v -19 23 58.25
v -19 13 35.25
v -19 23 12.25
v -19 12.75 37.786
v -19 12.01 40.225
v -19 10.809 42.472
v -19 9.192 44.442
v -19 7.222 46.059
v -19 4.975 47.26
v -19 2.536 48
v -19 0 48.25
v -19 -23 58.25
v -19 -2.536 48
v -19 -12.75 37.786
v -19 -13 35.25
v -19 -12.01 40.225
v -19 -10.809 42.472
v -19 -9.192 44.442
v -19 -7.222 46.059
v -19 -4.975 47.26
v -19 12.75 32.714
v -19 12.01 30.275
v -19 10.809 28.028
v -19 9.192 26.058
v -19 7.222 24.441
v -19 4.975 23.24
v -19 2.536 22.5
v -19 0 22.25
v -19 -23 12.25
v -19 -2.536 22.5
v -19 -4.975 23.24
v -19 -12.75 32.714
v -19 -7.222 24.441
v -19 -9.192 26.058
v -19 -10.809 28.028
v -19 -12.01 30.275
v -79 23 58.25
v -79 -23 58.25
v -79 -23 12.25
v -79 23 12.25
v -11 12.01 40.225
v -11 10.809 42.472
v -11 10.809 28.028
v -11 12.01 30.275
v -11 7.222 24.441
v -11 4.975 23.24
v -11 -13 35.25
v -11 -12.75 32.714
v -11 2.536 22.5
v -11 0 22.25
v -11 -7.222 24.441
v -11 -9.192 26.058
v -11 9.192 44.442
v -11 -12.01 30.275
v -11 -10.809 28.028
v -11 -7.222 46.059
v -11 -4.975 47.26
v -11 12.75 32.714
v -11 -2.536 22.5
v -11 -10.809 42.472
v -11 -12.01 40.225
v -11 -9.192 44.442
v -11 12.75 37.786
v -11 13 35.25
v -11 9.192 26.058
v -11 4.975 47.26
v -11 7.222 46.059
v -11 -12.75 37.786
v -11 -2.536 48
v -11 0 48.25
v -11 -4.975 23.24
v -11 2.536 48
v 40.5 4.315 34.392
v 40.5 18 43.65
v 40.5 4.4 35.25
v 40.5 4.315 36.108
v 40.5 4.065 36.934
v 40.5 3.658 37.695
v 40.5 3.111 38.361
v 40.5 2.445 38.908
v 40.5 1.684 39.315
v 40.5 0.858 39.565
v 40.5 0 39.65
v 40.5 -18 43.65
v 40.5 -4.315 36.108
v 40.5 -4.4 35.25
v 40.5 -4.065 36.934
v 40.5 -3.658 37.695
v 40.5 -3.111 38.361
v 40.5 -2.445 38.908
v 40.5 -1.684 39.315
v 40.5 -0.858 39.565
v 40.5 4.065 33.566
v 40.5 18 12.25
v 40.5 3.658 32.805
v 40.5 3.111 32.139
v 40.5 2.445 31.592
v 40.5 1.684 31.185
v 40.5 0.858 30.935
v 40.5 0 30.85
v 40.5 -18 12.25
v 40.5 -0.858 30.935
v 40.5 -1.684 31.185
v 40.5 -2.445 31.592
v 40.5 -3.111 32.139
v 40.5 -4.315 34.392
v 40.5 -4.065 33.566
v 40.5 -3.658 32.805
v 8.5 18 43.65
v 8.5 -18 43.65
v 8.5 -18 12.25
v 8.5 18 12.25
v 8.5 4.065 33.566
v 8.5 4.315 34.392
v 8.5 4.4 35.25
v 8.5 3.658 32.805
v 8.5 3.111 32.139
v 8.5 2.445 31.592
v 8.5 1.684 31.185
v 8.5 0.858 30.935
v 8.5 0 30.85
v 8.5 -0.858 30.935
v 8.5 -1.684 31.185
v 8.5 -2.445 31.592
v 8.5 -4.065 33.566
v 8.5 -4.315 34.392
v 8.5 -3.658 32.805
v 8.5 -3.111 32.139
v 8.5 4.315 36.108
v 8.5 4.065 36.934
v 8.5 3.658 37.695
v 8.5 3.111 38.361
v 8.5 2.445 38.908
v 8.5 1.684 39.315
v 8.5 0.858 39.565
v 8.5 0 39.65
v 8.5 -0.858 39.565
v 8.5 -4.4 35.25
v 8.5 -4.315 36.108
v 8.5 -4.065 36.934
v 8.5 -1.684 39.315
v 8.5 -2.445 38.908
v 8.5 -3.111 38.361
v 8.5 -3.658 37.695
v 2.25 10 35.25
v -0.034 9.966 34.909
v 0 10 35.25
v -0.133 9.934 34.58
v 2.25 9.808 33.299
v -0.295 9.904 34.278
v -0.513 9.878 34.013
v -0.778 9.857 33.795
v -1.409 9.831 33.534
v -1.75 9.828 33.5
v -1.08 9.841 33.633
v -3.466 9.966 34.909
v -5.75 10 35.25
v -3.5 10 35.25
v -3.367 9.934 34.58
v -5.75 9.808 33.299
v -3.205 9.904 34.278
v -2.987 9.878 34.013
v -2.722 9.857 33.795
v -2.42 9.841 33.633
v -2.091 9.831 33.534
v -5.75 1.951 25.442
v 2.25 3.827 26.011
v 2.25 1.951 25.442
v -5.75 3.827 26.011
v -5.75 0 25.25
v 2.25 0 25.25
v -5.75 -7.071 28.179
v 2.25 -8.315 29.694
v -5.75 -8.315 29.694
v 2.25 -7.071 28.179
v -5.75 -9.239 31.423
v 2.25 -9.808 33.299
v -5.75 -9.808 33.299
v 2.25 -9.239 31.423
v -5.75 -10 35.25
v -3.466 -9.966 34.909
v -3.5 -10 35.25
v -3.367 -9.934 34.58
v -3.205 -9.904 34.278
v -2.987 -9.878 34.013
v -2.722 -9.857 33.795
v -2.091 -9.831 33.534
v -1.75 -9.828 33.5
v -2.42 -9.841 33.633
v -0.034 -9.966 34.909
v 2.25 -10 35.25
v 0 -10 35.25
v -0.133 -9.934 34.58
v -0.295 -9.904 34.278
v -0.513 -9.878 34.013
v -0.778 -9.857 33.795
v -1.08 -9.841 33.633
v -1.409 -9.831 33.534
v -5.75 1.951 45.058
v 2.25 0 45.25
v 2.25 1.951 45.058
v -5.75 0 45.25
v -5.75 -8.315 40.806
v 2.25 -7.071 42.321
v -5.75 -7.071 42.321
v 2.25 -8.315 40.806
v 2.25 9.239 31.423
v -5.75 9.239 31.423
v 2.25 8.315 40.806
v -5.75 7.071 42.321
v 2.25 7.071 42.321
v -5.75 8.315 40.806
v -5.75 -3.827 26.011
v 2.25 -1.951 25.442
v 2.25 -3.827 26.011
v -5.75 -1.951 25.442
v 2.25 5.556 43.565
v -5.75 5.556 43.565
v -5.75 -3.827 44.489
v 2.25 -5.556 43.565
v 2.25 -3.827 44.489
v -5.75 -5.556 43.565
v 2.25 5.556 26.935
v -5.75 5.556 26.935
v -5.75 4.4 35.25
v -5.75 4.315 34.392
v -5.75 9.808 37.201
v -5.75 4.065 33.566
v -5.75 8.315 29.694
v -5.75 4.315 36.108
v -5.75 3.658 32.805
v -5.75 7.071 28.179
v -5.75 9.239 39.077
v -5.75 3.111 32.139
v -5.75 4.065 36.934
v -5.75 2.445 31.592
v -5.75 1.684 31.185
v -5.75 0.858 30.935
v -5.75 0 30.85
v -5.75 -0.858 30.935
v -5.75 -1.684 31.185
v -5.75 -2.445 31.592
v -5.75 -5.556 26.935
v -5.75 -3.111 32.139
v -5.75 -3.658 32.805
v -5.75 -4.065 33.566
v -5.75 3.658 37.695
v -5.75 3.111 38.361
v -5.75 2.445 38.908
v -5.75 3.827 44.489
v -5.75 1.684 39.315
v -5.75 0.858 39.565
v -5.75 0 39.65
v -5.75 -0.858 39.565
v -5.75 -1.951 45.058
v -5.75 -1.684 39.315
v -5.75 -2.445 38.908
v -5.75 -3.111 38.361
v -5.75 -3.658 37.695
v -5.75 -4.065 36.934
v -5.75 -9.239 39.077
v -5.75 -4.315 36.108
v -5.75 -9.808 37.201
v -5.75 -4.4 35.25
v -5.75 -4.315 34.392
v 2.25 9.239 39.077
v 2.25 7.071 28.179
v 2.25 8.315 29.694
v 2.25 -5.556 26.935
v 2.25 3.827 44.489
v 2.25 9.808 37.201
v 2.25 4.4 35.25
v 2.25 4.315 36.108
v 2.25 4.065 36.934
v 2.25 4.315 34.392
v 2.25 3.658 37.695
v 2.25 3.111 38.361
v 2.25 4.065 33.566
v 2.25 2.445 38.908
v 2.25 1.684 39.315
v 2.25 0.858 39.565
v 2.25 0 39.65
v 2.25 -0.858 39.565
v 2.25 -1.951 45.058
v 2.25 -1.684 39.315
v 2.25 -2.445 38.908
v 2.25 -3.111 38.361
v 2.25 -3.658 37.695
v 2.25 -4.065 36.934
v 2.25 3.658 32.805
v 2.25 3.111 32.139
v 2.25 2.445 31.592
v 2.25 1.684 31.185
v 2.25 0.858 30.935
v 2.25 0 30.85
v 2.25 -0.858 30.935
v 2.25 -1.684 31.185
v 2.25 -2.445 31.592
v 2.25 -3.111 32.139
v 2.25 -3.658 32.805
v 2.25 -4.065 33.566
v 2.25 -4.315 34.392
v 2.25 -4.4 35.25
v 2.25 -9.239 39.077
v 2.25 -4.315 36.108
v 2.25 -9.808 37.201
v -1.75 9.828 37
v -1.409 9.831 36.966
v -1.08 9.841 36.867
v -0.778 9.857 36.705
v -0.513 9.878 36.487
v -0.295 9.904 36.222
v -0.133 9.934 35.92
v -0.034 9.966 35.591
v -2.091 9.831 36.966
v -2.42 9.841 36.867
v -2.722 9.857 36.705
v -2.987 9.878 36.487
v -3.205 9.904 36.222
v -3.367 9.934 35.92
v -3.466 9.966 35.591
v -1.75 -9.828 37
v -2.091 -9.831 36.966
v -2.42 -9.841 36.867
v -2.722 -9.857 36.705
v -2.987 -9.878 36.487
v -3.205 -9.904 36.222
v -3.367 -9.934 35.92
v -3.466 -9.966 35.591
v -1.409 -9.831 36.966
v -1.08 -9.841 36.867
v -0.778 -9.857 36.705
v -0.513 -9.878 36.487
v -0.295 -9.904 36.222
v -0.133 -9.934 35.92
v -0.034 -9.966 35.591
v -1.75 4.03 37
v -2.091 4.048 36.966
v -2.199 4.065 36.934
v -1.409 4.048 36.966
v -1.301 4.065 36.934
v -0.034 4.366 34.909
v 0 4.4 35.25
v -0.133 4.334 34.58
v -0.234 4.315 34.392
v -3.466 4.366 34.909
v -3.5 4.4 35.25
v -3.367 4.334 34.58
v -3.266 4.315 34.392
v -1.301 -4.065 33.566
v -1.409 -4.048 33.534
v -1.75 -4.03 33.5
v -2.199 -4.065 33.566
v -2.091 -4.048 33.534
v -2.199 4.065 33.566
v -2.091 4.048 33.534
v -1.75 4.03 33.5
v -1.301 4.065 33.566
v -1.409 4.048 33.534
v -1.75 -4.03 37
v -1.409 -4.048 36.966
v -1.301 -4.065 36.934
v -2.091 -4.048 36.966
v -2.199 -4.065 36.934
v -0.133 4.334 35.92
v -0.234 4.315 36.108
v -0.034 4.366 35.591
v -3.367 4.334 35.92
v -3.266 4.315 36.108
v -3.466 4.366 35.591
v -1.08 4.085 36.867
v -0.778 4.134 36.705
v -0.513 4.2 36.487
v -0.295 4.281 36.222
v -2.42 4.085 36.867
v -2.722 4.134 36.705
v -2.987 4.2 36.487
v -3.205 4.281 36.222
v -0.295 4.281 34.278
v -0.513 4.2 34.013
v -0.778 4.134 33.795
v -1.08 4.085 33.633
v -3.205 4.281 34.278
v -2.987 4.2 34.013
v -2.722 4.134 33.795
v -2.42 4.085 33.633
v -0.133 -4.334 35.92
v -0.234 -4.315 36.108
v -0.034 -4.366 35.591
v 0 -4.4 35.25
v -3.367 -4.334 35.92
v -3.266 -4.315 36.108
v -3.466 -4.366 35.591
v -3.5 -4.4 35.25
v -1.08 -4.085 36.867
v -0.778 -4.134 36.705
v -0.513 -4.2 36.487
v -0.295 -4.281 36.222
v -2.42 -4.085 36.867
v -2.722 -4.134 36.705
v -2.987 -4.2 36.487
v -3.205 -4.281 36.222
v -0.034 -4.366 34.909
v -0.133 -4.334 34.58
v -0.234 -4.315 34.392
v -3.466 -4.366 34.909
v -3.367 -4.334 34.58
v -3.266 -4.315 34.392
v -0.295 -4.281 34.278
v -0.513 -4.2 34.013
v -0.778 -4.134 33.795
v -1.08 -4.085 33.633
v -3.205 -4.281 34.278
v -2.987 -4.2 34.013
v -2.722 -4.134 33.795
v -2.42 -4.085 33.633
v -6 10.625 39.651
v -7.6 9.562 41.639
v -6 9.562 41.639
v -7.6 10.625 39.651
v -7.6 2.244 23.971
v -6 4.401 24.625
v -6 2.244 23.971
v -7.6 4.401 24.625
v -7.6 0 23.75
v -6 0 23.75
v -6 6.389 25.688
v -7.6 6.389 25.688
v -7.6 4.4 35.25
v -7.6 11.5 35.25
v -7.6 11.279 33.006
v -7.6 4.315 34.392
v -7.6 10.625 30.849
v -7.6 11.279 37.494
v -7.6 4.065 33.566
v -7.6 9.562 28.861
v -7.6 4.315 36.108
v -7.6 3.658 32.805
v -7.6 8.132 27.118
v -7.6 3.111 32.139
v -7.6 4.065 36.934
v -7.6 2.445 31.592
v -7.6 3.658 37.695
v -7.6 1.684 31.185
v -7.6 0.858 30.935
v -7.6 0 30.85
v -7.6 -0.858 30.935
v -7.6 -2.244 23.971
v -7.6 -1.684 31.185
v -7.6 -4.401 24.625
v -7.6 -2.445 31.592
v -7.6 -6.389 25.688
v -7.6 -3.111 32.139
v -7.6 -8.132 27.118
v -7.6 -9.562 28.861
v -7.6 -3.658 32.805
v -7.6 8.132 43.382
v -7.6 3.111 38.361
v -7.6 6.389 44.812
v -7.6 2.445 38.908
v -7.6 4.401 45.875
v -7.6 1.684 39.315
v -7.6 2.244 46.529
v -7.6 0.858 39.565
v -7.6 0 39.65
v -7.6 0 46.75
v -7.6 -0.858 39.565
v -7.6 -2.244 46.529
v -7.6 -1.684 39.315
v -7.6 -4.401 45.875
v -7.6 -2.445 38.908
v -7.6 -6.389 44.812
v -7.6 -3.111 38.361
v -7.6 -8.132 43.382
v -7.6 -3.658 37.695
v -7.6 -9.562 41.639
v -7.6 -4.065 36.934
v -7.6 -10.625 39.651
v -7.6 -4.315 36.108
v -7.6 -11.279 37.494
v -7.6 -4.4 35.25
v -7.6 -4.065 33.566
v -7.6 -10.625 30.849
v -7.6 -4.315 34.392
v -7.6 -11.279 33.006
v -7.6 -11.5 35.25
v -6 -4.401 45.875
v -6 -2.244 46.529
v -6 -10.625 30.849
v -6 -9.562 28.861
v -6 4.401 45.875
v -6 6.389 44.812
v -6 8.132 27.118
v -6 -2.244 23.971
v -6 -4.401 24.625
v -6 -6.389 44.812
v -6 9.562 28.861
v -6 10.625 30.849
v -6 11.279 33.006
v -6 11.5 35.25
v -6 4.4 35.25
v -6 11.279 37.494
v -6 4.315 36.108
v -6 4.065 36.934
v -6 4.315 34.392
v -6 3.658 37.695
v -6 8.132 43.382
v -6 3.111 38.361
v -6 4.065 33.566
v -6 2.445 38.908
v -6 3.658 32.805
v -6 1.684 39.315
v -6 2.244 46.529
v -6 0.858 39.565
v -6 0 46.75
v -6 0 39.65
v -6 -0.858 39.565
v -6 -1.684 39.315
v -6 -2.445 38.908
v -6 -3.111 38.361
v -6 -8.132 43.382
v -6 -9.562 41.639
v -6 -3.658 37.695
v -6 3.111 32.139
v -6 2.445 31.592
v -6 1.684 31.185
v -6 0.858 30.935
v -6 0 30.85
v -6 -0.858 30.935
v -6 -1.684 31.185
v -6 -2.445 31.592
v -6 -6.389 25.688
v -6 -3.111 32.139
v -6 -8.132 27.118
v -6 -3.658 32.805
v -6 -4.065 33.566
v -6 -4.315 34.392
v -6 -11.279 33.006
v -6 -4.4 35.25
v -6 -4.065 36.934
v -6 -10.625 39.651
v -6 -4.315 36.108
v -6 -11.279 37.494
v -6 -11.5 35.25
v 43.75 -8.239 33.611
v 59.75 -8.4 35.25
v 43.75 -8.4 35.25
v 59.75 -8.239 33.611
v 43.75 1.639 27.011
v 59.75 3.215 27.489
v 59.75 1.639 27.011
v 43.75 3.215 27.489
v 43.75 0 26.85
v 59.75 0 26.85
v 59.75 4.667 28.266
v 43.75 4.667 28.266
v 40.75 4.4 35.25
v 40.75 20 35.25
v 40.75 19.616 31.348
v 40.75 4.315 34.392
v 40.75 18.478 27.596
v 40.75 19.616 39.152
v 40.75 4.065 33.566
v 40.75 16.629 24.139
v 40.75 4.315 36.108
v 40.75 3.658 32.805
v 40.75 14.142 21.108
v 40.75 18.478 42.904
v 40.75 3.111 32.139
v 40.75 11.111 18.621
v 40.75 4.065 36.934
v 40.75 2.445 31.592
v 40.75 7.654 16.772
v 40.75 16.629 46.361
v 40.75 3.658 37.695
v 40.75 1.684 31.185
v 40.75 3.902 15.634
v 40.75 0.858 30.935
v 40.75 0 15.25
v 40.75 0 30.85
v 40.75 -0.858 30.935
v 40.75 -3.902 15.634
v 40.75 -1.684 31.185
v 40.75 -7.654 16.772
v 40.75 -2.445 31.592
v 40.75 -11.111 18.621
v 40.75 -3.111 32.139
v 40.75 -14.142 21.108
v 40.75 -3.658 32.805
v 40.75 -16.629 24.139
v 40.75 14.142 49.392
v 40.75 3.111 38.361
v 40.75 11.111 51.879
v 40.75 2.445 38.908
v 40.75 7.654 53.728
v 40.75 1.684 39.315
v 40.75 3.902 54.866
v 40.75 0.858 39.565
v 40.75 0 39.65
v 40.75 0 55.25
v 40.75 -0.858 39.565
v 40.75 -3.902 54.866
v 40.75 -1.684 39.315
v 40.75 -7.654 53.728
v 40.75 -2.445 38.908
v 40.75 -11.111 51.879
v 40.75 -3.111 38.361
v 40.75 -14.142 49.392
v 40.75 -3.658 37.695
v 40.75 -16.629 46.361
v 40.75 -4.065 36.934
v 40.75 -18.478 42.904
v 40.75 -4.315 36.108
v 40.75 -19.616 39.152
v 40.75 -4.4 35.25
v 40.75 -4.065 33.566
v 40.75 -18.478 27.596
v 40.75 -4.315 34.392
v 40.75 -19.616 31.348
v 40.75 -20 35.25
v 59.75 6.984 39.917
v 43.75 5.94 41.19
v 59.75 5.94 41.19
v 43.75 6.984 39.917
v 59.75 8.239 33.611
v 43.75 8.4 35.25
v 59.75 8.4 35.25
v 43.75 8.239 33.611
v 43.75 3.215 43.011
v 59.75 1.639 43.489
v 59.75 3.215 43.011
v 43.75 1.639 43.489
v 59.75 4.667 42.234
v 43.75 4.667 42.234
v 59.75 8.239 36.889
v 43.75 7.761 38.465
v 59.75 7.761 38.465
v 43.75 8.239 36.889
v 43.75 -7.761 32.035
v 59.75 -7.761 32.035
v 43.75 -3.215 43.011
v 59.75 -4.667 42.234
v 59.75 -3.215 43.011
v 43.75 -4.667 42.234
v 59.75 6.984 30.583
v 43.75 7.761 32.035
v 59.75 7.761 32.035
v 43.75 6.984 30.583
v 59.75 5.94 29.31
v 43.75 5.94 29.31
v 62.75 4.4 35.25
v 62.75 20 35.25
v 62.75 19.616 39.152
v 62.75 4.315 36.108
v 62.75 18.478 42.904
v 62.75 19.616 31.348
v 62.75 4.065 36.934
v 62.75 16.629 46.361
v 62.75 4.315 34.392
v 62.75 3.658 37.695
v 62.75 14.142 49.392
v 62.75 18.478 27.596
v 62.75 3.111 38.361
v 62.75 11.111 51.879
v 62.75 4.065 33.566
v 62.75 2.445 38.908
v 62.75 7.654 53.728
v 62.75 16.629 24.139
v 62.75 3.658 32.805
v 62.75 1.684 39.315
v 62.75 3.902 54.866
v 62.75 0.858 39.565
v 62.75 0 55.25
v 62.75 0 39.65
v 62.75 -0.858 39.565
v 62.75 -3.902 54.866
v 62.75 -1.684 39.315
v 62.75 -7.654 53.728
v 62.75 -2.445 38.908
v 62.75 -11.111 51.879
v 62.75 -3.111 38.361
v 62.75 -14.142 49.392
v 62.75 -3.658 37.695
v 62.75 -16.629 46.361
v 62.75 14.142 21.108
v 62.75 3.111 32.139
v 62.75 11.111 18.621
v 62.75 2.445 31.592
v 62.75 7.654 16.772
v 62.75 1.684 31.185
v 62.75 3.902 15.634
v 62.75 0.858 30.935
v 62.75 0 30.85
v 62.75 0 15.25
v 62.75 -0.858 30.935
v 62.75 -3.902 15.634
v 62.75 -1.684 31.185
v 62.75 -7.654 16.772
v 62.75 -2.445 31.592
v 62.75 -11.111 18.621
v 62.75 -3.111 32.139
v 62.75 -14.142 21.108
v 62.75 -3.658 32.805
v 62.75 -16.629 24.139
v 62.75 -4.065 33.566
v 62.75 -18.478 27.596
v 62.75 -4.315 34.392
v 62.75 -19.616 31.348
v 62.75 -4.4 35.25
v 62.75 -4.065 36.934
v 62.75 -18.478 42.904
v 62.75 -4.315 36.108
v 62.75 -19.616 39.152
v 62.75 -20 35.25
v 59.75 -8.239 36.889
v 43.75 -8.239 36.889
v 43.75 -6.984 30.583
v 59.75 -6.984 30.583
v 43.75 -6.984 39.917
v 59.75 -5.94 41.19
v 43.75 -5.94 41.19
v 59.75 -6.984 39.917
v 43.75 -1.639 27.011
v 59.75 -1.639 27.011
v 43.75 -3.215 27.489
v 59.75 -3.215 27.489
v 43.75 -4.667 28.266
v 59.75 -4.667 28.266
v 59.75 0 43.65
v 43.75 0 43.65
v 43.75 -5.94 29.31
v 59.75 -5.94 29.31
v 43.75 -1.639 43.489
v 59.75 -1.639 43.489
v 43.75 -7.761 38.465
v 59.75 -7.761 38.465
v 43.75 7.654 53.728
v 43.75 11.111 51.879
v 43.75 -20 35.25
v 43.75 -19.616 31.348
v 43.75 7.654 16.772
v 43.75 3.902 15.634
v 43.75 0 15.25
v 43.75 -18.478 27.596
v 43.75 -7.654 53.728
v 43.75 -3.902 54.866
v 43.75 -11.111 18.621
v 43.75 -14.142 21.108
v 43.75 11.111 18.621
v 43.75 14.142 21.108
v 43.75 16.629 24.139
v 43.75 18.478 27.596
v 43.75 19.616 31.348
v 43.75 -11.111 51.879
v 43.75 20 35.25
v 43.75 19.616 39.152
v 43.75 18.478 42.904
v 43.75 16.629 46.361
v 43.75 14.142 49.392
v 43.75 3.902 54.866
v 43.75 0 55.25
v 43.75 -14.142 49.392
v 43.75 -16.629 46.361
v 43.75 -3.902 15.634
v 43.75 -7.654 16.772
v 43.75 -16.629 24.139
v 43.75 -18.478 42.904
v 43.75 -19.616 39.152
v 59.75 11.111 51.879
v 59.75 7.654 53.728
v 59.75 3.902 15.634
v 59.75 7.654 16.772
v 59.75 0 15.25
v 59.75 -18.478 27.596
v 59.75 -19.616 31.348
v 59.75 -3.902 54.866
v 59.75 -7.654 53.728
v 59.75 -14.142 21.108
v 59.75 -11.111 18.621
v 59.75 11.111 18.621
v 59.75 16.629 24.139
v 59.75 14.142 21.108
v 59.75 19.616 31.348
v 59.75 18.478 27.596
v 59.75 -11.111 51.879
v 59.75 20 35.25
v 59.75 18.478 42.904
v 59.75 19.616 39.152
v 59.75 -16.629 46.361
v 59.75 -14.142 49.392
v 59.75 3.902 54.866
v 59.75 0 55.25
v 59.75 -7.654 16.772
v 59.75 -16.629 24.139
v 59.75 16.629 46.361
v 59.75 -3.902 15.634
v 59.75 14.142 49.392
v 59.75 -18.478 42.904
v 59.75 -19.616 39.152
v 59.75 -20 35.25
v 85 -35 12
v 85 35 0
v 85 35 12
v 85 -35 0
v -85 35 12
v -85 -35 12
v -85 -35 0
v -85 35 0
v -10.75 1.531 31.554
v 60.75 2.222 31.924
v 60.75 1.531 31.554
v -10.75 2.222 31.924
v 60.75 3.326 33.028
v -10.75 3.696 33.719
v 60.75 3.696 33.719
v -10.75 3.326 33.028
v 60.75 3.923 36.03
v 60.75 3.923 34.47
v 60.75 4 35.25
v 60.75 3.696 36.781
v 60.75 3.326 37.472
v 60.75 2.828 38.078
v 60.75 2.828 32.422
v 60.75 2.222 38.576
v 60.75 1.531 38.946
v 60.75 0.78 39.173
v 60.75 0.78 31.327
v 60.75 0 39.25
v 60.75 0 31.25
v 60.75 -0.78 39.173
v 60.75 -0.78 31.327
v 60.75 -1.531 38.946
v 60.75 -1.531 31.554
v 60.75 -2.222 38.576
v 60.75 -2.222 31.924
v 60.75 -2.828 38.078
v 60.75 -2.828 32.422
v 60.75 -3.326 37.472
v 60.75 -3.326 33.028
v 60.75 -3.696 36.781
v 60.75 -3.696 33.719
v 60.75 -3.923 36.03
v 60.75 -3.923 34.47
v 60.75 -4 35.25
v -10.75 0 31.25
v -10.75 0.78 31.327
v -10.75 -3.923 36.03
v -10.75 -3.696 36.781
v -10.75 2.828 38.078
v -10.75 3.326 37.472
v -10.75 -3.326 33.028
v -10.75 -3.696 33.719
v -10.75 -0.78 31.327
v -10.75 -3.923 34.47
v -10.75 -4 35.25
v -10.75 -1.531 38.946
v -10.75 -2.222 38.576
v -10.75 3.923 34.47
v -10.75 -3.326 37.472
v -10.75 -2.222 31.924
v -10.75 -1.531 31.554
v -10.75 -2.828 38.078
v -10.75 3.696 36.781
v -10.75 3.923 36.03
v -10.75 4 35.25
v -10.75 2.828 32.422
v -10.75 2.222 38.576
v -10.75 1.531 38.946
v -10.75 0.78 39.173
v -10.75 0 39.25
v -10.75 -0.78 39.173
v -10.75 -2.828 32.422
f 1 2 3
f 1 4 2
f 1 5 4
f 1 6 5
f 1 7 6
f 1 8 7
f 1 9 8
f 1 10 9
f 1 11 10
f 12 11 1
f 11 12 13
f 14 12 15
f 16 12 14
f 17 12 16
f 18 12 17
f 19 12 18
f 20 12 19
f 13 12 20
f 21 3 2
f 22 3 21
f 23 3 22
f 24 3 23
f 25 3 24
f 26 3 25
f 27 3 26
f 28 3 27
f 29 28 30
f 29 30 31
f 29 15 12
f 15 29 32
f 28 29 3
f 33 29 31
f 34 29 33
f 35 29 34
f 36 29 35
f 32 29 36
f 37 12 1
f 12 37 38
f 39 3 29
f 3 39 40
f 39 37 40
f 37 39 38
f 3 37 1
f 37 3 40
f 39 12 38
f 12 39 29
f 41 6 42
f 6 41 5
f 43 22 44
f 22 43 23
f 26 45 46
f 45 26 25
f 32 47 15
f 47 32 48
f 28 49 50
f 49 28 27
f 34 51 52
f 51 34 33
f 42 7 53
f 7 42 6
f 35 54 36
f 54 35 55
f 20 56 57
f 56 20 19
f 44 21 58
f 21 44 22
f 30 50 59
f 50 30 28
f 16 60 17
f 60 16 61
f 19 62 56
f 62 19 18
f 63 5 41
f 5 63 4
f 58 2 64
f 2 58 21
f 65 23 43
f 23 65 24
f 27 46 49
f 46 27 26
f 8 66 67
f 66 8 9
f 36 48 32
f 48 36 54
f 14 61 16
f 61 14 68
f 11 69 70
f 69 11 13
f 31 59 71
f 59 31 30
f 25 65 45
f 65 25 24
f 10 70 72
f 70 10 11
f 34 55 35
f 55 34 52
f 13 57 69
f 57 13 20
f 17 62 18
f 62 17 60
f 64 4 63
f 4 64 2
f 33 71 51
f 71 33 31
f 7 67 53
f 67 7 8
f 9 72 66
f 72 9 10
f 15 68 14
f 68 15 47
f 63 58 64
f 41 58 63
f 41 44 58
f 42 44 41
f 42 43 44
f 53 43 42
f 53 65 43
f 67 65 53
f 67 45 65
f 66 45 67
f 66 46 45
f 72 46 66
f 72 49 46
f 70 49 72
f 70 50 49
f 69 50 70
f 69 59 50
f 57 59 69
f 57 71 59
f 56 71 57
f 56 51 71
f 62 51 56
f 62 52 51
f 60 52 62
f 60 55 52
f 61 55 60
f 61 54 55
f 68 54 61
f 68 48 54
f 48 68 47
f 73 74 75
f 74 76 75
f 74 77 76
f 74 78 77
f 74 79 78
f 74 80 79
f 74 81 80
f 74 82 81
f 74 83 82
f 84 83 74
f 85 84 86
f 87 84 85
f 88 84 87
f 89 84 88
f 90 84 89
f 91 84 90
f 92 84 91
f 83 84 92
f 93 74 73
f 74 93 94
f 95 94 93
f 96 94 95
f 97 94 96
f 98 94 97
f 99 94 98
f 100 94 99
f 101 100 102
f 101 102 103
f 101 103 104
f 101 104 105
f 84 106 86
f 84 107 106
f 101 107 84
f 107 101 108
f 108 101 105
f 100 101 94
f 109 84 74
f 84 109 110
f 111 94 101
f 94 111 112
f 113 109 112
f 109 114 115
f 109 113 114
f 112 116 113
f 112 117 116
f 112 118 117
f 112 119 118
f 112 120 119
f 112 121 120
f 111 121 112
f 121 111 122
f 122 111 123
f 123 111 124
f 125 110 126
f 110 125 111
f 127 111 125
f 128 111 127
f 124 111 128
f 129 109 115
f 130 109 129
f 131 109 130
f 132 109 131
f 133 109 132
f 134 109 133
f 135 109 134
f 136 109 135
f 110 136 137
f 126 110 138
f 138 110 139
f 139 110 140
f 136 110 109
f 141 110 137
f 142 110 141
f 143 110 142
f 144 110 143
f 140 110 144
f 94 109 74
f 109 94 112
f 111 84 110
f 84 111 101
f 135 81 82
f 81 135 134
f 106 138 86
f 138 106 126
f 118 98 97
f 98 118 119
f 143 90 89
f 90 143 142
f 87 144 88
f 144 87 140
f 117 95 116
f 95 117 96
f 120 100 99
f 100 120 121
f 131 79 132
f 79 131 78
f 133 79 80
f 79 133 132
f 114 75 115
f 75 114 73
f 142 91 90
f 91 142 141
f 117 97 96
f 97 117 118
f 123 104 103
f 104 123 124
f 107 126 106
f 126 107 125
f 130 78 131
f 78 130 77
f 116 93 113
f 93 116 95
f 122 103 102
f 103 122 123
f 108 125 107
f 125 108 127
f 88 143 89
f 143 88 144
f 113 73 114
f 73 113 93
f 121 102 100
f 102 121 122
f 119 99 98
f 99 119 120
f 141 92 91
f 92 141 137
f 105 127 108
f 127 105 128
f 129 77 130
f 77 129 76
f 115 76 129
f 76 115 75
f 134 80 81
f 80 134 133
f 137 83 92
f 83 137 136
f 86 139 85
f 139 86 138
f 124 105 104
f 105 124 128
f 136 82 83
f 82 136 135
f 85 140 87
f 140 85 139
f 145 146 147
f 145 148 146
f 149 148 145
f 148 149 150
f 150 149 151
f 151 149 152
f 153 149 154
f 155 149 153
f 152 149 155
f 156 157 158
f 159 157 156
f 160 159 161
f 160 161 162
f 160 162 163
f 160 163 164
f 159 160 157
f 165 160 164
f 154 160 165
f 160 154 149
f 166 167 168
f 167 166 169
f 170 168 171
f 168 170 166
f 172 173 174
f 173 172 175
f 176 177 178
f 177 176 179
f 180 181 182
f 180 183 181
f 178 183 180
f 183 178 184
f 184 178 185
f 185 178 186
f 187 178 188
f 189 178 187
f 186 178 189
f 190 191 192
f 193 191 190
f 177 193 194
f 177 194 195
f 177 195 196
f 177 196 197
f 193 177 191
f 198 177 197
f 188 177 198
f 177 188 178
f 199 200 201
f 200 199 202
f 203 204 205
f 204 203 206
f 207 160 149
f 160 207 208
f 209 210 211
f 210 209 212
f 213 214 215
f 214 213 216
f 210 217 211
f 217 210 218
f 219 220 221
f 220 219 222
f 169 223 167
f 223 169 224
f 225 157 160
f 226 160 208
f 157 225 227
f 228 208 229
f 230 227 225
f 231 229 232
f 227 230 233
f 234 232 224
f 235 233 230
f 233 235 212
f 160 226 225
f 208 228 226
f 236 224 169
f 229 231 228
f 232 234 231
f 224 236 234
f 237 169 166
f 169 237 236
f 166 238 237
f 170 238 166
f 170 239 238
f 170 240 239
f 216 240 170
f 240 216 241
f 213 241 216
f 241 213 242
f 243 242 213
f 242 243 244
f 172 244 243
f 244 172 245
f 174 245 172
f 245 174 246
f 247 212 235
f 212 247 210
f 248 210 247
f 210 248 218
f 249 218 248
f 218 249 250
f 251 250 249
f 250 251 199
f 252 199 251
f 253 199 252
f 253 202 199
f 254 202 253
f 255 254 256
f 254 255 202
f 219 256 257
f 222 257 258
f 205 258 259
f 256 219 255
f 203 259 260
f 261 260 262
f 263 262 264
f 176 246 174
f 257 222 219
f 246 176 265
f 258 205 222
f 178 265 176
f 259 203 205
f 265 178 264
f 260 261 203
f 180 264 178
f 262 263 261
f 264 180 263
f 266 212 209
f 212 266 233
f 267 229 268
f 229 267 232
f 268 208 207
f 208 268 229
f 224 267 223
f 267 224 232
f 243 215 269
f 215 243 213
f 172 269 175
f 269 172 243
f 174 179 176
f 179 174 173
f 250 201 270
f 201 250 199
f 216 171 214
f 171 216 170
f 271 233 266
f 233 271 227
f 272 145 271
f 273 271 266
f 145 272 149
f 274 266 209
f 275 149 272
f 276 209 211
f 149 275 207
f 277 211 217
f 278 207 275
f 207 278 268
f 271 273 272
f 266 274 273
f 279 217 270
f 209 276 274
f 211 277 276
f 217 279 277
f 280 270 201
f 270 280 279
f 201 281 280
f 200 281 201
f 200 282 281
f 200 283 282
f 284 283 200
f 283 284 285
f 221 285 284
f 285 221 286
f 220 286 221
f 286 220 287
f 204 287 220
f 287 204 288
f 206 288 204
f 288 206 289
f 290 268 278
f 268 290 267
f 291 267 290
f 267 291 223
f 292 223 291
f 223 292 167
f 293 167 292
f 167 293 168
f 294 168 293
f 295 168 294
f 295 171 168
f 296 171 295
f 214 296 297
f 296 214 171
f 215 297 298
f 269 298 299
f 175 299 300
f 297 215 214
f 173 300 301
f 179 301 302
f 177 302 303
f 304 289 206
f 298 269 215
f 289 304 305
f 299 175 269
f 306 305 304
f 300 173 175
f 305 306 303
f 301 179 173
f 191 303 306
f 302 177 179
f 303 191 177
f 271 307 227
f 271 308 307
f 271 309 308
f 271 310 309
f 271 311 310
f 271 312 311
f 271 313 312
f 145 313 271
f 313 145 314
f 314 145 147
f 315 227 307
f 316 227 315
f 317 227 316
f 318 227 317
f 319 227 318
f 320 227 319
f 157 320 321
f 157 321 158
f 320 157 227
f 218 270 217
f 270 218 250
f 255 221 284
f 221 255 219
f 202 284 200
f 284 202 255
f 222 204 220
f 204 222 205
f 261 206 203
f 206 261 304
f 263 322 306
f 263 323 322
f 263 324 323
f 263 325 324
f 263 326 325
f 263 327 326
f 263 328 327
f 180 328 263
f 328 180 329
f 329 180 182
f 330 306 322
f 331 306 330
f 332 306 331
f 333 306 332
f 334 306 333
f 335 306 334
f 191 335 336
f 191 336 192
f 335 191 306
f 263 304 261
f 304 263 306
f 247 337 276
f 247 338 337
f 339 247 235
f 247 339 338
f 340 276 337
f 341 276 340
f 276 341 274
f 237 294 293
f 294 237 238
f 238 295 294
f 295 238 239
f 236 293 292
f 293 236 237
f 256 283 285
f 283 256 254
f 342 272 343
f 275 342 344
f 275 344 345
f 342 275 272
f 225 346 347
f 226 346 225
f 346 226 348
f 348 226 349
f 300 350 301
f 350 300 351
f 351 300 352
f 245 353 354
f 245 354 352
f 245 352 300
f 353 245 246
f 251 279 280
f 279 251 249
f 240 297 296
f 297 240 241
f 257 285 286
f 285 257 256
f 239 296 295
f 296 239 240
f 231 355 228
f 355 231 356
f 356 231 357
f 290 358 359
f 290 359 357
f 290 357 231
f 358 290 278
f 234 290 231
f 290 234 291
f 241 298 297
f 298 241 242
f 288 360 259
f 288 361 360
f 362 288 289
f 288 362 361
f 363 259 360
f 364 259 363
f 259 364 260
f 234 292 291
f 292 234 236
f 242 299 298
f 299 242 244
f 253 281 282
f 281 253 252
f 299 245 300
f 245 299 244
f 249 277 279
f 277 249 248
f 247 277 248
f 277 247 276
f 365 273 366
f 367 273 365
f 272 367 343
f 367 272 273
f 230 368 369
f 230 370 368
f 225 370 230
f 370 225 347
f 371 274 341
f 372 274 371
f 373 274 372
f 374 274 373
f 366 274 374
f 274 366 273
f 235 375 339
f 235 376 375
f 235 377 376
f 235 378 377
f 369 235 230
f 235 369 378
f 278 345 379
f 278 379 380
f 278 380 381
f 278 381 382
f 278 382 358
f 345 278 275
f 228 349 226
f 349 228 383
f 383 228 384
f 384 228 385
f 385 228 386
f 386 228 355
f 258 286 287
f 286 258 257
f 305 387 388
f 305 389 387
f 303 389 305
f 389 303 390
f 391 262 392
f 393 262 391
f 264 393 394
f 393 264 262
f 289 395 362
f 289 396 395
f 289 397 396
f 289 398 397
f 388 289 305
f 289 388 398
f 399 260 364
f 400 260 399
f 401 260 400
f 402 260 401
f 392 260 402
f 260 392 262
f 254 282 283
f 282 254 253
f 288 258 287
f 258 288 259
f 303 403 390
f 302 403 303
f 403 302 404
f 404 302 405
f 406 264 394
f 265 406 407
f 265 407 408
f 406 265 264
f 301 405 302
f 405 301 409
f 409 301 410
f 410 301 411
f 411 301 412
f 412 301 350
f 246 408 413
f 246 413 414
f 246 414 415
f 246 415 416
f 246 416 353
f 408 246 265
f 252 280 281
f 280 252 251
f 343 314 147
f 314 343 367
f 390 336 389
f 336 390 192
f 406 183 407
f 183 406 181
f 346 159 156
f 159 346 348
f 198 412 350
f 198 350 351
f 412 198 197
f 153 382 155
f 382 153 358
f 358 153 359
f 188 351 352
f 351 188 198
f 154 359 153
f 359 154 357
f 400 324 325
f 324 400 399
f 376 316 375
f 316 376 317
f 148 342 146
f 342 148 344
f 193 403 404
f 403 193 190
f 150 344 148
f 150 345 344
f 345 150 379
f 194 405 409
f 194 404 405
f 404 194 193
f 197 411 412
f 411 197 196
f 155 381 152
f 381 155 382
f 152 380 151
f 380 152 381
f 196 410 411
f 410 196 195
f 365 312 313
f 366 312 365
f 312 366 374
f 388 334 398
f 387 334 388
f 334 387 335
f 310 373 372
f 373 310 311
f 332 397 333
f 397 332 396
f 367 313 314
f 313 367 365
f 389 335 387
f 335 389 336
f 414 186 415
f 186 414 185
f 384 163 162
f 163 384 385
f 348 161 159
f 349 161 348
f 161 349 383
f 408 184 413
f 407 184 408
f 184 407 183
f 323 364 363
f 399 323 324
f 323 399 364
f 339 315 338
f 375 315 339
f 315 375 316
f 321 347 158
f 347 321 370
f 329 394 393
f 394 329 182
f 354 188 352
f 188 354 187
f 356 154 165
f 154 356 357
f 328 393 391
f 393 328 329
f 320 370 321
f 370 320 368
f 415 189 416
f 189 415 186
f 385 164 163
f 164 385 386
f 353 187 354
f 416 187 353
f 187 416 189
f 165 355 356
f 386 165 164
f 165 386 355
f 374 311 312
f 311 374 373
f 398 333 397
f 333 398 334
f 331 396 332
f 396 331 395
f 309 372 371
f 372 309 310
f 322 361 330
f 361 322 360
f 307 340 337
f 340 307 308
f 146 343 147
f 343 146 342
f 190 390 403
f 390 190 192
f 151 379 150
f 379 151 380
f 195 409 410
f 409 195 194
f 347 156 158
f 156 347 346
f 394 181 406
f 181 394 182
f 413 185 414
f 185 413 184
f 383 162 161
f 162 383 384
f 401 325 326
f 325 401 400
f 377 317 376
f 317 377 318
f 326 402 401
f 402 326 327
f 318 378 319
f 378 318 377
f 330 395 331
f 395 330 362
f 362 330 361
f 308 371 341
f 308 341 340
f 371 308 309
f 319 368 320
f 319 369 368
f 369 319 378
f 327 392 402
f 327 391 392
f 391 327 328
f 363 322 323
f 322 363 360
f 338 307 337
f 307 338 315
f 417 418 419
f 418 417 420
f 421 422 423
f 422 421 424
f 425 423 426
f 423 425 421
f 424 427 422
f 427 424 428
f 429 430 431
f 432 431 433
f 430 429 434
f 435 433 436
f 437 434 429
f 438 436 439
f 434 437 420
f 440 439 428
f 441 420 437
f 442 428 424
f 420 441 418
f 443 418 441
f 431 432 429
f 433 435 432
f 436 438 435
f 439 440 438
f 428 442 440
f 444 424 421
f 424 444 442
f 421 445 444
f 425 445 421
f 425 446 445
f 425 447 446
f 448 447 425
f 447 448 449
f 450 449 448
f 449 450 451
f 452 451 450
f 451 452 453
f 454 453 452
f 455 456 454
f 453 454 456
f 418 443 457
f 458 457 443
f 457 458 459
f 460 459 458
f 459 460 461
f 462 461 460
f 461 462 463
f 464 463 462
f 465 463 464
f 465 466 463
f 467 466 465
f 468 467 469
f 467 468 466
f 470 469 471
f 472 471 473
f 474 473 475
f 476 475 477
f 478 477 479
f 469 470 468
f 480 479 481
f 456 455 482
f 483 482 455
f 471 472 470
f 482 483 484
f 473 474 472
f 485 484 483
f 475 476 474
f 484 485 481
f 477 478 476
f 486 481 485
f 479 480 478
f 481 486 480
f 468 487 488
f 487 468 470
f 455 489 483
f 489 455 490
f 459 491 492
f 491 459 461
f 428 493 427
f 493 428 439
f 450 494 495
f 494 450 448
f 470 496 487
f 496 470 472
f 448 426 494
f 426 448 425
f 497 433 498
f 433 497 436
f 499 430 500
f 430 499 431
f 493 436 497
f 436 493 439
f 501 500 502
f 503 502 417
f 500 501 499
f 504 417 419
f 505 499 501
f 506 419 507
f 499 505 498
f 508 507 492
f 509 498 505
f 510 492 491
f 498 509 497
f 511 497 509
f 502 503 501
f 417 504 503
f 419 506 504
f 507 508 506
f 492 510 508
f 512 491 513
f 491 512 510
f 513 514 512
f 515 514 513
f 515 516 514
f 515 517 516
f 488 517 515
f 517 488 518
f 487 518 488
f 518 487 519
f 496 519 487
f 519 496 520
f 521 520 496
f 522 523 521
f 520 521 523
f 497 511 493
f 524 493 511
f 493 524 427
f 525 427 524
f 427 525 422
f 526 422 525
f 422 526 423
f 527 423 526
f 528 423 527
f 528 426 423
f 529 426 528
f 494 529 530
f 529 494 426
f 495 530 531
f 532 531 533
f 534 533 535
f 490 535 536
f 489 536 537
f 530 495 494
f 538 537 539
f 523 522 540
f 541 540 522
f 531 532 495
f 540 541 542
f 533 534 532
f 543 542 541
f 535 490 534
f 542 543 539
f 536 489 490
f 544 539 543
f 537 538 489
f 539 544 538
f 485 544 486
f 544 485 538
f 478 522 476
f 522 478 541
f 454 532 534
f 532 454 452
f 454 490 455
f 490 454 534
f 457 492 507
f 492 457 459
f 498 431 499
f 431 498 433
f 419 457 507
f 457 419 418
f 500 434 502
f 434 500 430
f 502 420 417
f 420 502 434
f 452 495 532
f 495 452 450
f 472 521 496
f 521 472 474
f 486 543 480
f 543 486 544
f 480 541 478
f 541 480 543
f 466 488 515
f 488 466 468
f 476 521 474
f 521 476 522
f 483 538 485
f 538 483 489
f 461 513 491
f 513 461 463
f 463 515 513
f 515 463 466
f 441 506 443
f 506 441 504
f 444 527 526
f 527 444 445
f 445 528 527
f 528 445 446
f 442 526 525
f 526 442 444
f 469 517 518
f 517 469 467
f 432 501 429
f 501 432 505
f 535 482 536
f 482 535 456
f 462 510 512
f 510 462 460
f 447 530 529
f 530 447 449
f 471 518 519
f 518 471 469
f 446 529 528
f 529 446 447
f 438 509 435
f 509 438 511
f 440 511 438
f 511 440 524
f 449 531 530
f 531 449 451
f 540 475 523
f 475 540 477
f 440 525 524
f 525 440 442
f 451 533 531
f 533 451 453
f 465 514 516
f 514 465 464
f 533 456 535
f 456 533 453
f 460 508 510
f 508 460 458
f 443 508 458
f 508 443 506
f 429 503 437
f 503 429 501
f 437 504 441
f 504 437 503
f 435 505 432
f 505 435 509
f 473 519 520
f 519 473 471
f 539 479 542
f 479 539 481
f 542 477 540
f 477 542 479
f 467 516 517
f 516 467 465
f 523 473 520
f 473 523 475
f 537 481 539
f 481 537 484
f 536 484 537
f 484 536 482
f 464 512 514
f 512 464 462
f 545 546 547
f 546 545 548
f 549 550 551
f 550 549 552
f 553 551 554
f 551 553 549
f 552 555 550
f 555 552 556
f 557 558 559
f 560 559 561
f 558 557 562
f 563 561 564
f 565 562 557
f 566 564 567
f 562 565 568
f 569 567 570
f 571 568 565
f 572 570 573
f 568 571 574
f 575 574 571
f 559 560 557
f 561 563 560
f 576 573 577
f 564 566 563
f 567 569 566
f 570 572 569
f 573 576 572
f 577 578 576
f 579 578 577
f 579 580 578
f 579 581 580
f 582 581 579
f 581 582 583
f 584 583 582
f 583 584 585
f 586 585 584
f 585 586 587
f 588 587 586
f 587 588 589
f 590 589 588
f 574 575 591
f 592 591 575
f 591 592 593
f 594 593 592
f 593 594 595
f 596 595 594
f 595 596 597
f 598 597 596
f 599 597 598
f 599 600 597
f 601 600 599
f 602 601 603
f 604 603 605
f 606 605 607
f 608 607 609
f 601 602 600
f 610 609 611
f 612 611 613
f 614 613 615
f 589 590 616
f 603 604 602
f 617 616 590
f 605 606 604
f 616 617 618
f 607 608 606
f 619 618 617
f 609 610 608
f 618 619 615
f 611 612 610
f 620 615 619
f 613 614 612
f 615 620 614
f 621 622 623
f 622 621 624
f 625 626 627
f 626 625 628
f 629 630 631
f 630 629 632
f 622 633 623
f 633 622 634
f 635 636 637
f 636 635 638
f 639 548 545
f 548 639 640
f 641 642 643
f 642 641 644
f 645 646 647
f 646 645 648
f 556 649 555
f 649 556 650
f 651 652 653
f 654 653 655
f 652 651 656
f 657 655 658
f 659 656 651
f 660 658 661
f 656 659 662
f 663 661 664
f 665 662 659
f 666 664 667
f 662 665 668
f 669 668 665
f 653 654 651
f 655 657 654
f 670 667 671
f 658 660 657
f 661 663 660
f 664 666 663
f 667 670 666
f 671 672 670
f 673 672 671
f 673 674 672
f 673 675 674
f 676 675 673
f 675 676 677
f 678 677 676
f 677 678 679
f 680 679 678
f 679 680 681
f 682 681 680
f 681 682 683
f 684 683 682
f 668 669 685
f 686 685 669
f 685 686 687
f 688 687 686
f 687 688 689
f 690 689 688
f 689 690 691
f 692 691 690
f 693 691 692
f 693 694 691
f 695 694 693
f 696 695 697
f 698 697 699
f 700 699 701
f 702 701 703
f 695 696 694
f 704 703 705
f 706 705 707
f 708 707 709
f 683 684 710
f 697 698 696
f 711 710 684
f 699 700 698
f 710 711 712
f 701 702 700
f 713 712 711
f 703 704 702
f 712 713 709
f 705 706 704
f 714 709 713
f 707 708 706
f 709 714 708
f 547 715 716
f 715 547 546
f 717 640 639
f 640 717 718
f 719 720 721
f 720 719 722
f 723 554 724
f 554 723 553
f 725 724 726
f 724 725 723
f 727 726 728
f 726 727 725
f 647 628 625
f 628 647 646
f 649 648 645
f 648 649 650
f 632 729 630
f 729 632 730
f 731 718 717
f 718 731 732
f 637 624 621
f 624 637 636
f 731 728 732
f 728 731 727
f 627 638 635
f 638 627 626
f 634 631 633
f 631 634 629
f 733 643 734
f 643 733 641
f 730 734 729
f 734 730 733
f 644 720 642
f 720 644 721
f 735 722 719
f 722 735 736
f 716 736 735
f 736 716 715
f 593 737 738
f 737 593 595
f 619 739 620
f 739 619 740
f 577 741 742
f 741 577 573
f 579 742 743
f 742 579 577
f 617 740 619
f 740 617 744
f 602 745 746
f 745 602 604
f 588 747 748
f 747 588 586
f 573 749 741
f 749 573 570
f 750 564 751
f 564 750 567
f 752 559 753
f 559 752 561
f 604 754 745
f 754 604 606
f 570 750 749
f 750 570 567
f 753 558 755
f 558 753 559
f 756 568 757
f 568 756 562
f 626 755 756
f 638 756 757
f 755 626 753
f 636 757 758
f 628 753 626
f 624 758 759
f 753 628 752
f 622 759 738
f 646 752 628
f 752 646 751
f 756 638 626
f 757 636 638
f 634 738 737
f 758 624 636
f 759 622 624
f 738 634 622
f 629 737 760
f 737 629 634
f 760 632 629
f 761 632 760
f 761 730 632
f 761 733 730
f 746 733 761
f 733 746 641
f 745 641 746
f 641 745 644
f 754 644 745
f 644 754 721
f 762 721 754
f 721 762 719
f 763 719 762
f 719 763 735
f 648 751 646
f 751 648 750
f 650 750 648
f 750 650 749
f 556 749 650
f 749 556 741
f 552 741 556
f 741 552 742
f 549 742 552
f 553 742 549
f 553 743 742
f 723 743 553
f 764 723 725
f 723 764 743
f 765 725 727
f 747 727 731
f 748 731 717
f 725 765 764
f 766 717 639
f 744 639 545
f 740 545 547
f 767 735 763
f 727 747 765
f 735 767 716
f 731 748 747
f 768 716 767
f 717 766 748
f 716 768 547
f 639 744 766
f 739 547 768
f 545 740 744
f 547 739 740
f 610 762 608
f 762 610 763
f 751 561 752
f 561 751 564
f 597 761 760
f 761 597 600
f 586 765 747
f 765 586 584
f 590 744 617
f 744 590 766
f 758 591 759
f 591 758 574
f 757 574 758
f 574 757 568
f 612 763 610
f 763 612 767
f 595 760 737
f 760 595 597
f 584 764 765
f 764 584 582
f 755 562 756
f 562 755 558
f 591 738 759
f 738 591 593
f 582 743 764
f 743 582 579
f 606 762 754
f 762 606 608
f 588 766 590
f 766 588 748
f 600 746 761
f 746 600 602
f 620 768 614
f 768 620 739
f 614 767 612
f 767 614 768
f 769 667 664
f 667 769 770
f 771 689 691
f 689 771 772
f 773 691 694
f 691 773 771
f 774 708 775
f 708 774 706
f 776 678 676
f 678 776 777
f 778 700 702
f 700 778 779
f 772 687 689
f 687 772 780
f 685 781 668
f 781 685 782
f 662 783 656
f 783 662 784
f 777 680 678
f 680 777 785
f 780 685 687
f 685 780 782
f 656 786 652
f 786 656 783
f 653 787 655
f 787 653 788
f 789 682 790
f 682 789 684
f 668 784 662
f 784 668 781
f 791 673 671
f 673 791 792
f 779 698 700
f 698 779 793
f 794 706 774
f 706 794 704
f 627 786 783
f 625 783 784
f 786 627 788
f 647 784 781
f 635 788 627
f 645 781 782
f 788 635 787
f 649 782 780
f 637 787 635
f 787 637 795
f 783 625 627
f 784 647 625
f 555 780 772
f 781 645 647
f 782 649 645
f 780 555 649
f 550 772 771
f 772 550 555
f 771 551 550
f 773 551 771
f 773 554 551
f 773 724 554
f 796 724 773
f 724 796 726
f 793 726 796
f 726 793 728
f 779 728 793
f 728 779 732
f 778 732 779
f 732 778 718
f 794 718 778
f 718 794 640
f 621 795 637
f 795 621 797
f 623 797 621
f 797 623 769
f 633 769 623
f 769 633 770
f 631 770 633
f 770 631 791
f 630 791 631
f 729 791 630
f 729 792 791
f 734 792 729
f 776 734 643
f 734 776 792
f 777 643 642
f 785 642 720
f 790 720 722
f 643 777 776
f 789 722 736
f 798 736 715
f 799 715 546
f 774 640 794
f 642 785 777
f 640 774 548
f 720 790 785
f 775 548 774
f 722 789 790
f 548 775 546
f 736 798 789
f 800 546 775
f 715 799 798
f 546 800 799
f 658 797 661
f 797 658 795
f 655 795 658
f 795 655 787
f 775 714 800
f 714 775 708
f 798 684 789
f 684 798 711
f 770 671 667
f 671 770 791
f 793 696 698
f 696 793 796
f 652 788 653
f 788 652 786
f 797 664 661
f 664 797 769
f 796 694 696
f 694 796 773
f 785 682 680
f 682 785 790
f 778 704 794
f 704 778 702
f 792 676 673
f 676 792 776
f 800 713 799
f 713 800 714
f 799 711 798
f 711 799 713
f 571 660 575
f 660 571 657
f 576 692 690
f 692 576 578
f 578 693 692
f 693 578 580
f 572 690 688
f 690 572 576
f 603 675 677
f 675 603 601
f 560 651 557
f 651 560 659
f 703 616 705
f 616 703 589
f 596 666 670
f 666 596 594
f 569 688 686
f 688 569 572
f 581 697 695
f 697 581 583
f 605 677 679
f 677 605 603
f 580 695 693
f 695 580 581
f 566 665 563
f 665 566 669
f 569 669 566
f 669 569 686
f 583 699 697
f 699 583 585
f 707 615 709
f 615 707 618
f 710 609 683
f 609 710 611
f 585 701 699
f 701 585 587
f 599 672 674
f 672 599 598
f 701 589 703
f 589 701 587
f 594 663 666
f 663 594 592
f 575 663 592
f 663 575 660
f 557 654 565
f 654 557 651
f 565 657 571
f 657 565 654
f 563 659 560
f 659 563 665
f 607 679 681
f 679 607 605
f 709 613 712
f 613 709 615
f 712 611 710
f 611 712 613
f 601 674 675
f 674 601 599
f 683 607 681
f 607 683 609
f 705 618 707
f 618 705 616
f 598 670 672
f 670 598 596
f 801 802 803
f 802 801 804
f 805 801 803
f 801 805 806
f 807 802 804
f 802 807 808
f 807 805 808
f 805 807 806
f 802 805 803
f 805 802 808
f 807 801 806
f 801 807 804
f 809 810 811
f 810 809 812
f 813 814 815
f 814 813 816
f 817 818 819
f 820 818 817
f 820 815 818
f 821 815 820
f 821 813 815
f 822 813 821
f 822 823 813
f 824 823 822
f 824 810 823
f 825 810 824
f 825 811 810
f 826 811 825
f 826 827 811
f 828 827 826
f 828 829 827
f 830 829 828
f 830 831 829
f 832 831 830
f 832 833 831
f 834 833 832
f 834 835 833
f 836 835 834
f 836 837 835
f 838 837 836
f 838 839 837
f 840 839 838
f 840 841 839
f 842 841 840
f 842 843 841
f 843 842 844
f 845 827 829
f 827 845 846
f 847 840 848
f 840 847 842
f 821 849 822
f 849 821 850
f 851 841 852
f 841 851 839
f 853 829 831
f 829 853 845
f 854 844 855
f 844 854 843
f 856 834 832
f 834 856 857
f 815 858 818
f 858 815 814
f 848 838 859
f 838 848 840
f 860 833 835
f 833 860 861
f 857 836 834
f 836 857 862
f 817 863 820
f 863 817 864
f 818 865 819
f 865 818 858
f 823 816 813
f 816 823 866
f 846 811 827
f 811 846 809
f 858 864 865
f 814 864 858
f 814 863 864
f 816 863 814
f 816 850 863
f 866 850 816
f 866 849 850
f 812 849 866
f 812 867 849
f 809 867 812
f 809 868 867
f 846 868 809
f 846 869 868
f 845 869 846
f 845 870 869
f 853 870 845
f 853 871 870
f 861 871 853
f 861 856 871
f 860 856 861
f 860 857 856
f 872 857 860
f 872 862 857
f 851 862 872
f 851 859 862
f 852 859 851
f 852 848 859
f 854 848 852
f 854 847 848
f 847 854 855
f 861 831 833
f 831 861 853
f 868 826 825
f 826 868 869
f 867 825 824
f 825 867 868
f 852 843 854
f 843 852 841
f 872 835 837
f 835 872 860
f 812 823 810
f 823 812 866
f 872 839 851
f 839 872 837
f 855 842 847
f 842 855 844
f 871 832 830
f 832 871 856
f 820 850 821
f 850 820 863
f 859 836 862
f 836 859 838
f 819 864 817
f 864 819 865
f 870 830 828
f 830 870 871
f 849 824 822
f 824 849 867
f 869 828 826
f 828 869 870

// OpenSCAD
$fn = 32;

// ------------------------------------------------------------------------
// Motor drive station: motor 60 x 46 mm, shaft d8, pulley d40
// Every part is its own module, assembly() places every instance.
// ------------------------------------------------------------------------

// --- part 1 ---
module station_bed() {
  difference() {
    translate([-85, -35, 0]) cube([170, 70, 12]);
  }
}

// --- part 2 ---
module drive_motor() {
  union() {
    translate([-30, -23, 0]) cube([60, 46, 46]);
    translate([34, 0, 23]) rotate([0, 90, 0]) cylinder(h = 8, d = 26, center = true);
  }
}

// --- part 3 ---
module pillow_block() {
  difference() {
    translate([-16, -18, 0]) cube([32, 36, 31.4]);
    translate([0, 0, 23]) rotate([0, 90, 0]) cylinder(h = 34, d = 8.8, center = true);
  }
}

// --- part 4 ---
module drive_shaft() {
  translate([0, 0, -35.75]) cylinder(h = 71.5, d = 8);
}

// --- part 5 ---
module shaft_collar() {
  difference() {
    cylinder(h = 8, d = 20);
    translate([0, 0, -1]) cylinder(h = 10, d = 8.8);
    translate([0, 0, 4]) rotate([90, 0, 0]) cylinder(h = 22, d = 3.5, center = true);
  }
}

// --- part 6 ---
module collar_washer() {
  difference() {
      translate([0, 0, 0]) cylinder(h = 1.6, d = 23);
      translate([0, 0, -1]) cylinder(h = 3.6, d = 8.8);
    }
}

// --- part 7 ---
module drive_pulley() {
  difference() {
    union() {
      cylinder(h = 22, d = 16.8);
      cylinder(h = 3, d = 40);
      translate([0, 0, 19]) cylinder(h = 3, d = 40);
    }
    translate([0, 0, -1]) cylinder(h = 24, d = 8.8);
  }
}

// --- assembly ---
module assembly() {
  color([0.80, 0.24, 0.20]) translate([0, 0, 0]) rotate([0, 0, 0]) station_bed();
  color([0.20, 0.45, 0.75]) translate([-49, 0, 12.25]) rotate([0, 0, 0]) drive_motor();
  color([0.25, 0.62, 0.32]) translate([24.5, 0, 12.25]) rotate([0, 0, 0]) pillow_block();
  color([0.92, 0.70, 0.18]) translate([25, 0, 35.25]) rotate([0, 90, 0]) drive_shaft();
  color([0.58, 0.35, 0.70]) translate([-5.75, 0, 35.25]) rotate([0, 90, 0]) shaft_collar();
  color([0.16, 0.66, 0.66]) translate([-7.6, 0, 35.25]) rotate([0, 90, 0]) collar_washer();
  color([0.85, 0.48, 0.18]) translate([40.75, 0, 35.25]) rotate([0, 90, 0]) drive_pulley();
}

assembly();
